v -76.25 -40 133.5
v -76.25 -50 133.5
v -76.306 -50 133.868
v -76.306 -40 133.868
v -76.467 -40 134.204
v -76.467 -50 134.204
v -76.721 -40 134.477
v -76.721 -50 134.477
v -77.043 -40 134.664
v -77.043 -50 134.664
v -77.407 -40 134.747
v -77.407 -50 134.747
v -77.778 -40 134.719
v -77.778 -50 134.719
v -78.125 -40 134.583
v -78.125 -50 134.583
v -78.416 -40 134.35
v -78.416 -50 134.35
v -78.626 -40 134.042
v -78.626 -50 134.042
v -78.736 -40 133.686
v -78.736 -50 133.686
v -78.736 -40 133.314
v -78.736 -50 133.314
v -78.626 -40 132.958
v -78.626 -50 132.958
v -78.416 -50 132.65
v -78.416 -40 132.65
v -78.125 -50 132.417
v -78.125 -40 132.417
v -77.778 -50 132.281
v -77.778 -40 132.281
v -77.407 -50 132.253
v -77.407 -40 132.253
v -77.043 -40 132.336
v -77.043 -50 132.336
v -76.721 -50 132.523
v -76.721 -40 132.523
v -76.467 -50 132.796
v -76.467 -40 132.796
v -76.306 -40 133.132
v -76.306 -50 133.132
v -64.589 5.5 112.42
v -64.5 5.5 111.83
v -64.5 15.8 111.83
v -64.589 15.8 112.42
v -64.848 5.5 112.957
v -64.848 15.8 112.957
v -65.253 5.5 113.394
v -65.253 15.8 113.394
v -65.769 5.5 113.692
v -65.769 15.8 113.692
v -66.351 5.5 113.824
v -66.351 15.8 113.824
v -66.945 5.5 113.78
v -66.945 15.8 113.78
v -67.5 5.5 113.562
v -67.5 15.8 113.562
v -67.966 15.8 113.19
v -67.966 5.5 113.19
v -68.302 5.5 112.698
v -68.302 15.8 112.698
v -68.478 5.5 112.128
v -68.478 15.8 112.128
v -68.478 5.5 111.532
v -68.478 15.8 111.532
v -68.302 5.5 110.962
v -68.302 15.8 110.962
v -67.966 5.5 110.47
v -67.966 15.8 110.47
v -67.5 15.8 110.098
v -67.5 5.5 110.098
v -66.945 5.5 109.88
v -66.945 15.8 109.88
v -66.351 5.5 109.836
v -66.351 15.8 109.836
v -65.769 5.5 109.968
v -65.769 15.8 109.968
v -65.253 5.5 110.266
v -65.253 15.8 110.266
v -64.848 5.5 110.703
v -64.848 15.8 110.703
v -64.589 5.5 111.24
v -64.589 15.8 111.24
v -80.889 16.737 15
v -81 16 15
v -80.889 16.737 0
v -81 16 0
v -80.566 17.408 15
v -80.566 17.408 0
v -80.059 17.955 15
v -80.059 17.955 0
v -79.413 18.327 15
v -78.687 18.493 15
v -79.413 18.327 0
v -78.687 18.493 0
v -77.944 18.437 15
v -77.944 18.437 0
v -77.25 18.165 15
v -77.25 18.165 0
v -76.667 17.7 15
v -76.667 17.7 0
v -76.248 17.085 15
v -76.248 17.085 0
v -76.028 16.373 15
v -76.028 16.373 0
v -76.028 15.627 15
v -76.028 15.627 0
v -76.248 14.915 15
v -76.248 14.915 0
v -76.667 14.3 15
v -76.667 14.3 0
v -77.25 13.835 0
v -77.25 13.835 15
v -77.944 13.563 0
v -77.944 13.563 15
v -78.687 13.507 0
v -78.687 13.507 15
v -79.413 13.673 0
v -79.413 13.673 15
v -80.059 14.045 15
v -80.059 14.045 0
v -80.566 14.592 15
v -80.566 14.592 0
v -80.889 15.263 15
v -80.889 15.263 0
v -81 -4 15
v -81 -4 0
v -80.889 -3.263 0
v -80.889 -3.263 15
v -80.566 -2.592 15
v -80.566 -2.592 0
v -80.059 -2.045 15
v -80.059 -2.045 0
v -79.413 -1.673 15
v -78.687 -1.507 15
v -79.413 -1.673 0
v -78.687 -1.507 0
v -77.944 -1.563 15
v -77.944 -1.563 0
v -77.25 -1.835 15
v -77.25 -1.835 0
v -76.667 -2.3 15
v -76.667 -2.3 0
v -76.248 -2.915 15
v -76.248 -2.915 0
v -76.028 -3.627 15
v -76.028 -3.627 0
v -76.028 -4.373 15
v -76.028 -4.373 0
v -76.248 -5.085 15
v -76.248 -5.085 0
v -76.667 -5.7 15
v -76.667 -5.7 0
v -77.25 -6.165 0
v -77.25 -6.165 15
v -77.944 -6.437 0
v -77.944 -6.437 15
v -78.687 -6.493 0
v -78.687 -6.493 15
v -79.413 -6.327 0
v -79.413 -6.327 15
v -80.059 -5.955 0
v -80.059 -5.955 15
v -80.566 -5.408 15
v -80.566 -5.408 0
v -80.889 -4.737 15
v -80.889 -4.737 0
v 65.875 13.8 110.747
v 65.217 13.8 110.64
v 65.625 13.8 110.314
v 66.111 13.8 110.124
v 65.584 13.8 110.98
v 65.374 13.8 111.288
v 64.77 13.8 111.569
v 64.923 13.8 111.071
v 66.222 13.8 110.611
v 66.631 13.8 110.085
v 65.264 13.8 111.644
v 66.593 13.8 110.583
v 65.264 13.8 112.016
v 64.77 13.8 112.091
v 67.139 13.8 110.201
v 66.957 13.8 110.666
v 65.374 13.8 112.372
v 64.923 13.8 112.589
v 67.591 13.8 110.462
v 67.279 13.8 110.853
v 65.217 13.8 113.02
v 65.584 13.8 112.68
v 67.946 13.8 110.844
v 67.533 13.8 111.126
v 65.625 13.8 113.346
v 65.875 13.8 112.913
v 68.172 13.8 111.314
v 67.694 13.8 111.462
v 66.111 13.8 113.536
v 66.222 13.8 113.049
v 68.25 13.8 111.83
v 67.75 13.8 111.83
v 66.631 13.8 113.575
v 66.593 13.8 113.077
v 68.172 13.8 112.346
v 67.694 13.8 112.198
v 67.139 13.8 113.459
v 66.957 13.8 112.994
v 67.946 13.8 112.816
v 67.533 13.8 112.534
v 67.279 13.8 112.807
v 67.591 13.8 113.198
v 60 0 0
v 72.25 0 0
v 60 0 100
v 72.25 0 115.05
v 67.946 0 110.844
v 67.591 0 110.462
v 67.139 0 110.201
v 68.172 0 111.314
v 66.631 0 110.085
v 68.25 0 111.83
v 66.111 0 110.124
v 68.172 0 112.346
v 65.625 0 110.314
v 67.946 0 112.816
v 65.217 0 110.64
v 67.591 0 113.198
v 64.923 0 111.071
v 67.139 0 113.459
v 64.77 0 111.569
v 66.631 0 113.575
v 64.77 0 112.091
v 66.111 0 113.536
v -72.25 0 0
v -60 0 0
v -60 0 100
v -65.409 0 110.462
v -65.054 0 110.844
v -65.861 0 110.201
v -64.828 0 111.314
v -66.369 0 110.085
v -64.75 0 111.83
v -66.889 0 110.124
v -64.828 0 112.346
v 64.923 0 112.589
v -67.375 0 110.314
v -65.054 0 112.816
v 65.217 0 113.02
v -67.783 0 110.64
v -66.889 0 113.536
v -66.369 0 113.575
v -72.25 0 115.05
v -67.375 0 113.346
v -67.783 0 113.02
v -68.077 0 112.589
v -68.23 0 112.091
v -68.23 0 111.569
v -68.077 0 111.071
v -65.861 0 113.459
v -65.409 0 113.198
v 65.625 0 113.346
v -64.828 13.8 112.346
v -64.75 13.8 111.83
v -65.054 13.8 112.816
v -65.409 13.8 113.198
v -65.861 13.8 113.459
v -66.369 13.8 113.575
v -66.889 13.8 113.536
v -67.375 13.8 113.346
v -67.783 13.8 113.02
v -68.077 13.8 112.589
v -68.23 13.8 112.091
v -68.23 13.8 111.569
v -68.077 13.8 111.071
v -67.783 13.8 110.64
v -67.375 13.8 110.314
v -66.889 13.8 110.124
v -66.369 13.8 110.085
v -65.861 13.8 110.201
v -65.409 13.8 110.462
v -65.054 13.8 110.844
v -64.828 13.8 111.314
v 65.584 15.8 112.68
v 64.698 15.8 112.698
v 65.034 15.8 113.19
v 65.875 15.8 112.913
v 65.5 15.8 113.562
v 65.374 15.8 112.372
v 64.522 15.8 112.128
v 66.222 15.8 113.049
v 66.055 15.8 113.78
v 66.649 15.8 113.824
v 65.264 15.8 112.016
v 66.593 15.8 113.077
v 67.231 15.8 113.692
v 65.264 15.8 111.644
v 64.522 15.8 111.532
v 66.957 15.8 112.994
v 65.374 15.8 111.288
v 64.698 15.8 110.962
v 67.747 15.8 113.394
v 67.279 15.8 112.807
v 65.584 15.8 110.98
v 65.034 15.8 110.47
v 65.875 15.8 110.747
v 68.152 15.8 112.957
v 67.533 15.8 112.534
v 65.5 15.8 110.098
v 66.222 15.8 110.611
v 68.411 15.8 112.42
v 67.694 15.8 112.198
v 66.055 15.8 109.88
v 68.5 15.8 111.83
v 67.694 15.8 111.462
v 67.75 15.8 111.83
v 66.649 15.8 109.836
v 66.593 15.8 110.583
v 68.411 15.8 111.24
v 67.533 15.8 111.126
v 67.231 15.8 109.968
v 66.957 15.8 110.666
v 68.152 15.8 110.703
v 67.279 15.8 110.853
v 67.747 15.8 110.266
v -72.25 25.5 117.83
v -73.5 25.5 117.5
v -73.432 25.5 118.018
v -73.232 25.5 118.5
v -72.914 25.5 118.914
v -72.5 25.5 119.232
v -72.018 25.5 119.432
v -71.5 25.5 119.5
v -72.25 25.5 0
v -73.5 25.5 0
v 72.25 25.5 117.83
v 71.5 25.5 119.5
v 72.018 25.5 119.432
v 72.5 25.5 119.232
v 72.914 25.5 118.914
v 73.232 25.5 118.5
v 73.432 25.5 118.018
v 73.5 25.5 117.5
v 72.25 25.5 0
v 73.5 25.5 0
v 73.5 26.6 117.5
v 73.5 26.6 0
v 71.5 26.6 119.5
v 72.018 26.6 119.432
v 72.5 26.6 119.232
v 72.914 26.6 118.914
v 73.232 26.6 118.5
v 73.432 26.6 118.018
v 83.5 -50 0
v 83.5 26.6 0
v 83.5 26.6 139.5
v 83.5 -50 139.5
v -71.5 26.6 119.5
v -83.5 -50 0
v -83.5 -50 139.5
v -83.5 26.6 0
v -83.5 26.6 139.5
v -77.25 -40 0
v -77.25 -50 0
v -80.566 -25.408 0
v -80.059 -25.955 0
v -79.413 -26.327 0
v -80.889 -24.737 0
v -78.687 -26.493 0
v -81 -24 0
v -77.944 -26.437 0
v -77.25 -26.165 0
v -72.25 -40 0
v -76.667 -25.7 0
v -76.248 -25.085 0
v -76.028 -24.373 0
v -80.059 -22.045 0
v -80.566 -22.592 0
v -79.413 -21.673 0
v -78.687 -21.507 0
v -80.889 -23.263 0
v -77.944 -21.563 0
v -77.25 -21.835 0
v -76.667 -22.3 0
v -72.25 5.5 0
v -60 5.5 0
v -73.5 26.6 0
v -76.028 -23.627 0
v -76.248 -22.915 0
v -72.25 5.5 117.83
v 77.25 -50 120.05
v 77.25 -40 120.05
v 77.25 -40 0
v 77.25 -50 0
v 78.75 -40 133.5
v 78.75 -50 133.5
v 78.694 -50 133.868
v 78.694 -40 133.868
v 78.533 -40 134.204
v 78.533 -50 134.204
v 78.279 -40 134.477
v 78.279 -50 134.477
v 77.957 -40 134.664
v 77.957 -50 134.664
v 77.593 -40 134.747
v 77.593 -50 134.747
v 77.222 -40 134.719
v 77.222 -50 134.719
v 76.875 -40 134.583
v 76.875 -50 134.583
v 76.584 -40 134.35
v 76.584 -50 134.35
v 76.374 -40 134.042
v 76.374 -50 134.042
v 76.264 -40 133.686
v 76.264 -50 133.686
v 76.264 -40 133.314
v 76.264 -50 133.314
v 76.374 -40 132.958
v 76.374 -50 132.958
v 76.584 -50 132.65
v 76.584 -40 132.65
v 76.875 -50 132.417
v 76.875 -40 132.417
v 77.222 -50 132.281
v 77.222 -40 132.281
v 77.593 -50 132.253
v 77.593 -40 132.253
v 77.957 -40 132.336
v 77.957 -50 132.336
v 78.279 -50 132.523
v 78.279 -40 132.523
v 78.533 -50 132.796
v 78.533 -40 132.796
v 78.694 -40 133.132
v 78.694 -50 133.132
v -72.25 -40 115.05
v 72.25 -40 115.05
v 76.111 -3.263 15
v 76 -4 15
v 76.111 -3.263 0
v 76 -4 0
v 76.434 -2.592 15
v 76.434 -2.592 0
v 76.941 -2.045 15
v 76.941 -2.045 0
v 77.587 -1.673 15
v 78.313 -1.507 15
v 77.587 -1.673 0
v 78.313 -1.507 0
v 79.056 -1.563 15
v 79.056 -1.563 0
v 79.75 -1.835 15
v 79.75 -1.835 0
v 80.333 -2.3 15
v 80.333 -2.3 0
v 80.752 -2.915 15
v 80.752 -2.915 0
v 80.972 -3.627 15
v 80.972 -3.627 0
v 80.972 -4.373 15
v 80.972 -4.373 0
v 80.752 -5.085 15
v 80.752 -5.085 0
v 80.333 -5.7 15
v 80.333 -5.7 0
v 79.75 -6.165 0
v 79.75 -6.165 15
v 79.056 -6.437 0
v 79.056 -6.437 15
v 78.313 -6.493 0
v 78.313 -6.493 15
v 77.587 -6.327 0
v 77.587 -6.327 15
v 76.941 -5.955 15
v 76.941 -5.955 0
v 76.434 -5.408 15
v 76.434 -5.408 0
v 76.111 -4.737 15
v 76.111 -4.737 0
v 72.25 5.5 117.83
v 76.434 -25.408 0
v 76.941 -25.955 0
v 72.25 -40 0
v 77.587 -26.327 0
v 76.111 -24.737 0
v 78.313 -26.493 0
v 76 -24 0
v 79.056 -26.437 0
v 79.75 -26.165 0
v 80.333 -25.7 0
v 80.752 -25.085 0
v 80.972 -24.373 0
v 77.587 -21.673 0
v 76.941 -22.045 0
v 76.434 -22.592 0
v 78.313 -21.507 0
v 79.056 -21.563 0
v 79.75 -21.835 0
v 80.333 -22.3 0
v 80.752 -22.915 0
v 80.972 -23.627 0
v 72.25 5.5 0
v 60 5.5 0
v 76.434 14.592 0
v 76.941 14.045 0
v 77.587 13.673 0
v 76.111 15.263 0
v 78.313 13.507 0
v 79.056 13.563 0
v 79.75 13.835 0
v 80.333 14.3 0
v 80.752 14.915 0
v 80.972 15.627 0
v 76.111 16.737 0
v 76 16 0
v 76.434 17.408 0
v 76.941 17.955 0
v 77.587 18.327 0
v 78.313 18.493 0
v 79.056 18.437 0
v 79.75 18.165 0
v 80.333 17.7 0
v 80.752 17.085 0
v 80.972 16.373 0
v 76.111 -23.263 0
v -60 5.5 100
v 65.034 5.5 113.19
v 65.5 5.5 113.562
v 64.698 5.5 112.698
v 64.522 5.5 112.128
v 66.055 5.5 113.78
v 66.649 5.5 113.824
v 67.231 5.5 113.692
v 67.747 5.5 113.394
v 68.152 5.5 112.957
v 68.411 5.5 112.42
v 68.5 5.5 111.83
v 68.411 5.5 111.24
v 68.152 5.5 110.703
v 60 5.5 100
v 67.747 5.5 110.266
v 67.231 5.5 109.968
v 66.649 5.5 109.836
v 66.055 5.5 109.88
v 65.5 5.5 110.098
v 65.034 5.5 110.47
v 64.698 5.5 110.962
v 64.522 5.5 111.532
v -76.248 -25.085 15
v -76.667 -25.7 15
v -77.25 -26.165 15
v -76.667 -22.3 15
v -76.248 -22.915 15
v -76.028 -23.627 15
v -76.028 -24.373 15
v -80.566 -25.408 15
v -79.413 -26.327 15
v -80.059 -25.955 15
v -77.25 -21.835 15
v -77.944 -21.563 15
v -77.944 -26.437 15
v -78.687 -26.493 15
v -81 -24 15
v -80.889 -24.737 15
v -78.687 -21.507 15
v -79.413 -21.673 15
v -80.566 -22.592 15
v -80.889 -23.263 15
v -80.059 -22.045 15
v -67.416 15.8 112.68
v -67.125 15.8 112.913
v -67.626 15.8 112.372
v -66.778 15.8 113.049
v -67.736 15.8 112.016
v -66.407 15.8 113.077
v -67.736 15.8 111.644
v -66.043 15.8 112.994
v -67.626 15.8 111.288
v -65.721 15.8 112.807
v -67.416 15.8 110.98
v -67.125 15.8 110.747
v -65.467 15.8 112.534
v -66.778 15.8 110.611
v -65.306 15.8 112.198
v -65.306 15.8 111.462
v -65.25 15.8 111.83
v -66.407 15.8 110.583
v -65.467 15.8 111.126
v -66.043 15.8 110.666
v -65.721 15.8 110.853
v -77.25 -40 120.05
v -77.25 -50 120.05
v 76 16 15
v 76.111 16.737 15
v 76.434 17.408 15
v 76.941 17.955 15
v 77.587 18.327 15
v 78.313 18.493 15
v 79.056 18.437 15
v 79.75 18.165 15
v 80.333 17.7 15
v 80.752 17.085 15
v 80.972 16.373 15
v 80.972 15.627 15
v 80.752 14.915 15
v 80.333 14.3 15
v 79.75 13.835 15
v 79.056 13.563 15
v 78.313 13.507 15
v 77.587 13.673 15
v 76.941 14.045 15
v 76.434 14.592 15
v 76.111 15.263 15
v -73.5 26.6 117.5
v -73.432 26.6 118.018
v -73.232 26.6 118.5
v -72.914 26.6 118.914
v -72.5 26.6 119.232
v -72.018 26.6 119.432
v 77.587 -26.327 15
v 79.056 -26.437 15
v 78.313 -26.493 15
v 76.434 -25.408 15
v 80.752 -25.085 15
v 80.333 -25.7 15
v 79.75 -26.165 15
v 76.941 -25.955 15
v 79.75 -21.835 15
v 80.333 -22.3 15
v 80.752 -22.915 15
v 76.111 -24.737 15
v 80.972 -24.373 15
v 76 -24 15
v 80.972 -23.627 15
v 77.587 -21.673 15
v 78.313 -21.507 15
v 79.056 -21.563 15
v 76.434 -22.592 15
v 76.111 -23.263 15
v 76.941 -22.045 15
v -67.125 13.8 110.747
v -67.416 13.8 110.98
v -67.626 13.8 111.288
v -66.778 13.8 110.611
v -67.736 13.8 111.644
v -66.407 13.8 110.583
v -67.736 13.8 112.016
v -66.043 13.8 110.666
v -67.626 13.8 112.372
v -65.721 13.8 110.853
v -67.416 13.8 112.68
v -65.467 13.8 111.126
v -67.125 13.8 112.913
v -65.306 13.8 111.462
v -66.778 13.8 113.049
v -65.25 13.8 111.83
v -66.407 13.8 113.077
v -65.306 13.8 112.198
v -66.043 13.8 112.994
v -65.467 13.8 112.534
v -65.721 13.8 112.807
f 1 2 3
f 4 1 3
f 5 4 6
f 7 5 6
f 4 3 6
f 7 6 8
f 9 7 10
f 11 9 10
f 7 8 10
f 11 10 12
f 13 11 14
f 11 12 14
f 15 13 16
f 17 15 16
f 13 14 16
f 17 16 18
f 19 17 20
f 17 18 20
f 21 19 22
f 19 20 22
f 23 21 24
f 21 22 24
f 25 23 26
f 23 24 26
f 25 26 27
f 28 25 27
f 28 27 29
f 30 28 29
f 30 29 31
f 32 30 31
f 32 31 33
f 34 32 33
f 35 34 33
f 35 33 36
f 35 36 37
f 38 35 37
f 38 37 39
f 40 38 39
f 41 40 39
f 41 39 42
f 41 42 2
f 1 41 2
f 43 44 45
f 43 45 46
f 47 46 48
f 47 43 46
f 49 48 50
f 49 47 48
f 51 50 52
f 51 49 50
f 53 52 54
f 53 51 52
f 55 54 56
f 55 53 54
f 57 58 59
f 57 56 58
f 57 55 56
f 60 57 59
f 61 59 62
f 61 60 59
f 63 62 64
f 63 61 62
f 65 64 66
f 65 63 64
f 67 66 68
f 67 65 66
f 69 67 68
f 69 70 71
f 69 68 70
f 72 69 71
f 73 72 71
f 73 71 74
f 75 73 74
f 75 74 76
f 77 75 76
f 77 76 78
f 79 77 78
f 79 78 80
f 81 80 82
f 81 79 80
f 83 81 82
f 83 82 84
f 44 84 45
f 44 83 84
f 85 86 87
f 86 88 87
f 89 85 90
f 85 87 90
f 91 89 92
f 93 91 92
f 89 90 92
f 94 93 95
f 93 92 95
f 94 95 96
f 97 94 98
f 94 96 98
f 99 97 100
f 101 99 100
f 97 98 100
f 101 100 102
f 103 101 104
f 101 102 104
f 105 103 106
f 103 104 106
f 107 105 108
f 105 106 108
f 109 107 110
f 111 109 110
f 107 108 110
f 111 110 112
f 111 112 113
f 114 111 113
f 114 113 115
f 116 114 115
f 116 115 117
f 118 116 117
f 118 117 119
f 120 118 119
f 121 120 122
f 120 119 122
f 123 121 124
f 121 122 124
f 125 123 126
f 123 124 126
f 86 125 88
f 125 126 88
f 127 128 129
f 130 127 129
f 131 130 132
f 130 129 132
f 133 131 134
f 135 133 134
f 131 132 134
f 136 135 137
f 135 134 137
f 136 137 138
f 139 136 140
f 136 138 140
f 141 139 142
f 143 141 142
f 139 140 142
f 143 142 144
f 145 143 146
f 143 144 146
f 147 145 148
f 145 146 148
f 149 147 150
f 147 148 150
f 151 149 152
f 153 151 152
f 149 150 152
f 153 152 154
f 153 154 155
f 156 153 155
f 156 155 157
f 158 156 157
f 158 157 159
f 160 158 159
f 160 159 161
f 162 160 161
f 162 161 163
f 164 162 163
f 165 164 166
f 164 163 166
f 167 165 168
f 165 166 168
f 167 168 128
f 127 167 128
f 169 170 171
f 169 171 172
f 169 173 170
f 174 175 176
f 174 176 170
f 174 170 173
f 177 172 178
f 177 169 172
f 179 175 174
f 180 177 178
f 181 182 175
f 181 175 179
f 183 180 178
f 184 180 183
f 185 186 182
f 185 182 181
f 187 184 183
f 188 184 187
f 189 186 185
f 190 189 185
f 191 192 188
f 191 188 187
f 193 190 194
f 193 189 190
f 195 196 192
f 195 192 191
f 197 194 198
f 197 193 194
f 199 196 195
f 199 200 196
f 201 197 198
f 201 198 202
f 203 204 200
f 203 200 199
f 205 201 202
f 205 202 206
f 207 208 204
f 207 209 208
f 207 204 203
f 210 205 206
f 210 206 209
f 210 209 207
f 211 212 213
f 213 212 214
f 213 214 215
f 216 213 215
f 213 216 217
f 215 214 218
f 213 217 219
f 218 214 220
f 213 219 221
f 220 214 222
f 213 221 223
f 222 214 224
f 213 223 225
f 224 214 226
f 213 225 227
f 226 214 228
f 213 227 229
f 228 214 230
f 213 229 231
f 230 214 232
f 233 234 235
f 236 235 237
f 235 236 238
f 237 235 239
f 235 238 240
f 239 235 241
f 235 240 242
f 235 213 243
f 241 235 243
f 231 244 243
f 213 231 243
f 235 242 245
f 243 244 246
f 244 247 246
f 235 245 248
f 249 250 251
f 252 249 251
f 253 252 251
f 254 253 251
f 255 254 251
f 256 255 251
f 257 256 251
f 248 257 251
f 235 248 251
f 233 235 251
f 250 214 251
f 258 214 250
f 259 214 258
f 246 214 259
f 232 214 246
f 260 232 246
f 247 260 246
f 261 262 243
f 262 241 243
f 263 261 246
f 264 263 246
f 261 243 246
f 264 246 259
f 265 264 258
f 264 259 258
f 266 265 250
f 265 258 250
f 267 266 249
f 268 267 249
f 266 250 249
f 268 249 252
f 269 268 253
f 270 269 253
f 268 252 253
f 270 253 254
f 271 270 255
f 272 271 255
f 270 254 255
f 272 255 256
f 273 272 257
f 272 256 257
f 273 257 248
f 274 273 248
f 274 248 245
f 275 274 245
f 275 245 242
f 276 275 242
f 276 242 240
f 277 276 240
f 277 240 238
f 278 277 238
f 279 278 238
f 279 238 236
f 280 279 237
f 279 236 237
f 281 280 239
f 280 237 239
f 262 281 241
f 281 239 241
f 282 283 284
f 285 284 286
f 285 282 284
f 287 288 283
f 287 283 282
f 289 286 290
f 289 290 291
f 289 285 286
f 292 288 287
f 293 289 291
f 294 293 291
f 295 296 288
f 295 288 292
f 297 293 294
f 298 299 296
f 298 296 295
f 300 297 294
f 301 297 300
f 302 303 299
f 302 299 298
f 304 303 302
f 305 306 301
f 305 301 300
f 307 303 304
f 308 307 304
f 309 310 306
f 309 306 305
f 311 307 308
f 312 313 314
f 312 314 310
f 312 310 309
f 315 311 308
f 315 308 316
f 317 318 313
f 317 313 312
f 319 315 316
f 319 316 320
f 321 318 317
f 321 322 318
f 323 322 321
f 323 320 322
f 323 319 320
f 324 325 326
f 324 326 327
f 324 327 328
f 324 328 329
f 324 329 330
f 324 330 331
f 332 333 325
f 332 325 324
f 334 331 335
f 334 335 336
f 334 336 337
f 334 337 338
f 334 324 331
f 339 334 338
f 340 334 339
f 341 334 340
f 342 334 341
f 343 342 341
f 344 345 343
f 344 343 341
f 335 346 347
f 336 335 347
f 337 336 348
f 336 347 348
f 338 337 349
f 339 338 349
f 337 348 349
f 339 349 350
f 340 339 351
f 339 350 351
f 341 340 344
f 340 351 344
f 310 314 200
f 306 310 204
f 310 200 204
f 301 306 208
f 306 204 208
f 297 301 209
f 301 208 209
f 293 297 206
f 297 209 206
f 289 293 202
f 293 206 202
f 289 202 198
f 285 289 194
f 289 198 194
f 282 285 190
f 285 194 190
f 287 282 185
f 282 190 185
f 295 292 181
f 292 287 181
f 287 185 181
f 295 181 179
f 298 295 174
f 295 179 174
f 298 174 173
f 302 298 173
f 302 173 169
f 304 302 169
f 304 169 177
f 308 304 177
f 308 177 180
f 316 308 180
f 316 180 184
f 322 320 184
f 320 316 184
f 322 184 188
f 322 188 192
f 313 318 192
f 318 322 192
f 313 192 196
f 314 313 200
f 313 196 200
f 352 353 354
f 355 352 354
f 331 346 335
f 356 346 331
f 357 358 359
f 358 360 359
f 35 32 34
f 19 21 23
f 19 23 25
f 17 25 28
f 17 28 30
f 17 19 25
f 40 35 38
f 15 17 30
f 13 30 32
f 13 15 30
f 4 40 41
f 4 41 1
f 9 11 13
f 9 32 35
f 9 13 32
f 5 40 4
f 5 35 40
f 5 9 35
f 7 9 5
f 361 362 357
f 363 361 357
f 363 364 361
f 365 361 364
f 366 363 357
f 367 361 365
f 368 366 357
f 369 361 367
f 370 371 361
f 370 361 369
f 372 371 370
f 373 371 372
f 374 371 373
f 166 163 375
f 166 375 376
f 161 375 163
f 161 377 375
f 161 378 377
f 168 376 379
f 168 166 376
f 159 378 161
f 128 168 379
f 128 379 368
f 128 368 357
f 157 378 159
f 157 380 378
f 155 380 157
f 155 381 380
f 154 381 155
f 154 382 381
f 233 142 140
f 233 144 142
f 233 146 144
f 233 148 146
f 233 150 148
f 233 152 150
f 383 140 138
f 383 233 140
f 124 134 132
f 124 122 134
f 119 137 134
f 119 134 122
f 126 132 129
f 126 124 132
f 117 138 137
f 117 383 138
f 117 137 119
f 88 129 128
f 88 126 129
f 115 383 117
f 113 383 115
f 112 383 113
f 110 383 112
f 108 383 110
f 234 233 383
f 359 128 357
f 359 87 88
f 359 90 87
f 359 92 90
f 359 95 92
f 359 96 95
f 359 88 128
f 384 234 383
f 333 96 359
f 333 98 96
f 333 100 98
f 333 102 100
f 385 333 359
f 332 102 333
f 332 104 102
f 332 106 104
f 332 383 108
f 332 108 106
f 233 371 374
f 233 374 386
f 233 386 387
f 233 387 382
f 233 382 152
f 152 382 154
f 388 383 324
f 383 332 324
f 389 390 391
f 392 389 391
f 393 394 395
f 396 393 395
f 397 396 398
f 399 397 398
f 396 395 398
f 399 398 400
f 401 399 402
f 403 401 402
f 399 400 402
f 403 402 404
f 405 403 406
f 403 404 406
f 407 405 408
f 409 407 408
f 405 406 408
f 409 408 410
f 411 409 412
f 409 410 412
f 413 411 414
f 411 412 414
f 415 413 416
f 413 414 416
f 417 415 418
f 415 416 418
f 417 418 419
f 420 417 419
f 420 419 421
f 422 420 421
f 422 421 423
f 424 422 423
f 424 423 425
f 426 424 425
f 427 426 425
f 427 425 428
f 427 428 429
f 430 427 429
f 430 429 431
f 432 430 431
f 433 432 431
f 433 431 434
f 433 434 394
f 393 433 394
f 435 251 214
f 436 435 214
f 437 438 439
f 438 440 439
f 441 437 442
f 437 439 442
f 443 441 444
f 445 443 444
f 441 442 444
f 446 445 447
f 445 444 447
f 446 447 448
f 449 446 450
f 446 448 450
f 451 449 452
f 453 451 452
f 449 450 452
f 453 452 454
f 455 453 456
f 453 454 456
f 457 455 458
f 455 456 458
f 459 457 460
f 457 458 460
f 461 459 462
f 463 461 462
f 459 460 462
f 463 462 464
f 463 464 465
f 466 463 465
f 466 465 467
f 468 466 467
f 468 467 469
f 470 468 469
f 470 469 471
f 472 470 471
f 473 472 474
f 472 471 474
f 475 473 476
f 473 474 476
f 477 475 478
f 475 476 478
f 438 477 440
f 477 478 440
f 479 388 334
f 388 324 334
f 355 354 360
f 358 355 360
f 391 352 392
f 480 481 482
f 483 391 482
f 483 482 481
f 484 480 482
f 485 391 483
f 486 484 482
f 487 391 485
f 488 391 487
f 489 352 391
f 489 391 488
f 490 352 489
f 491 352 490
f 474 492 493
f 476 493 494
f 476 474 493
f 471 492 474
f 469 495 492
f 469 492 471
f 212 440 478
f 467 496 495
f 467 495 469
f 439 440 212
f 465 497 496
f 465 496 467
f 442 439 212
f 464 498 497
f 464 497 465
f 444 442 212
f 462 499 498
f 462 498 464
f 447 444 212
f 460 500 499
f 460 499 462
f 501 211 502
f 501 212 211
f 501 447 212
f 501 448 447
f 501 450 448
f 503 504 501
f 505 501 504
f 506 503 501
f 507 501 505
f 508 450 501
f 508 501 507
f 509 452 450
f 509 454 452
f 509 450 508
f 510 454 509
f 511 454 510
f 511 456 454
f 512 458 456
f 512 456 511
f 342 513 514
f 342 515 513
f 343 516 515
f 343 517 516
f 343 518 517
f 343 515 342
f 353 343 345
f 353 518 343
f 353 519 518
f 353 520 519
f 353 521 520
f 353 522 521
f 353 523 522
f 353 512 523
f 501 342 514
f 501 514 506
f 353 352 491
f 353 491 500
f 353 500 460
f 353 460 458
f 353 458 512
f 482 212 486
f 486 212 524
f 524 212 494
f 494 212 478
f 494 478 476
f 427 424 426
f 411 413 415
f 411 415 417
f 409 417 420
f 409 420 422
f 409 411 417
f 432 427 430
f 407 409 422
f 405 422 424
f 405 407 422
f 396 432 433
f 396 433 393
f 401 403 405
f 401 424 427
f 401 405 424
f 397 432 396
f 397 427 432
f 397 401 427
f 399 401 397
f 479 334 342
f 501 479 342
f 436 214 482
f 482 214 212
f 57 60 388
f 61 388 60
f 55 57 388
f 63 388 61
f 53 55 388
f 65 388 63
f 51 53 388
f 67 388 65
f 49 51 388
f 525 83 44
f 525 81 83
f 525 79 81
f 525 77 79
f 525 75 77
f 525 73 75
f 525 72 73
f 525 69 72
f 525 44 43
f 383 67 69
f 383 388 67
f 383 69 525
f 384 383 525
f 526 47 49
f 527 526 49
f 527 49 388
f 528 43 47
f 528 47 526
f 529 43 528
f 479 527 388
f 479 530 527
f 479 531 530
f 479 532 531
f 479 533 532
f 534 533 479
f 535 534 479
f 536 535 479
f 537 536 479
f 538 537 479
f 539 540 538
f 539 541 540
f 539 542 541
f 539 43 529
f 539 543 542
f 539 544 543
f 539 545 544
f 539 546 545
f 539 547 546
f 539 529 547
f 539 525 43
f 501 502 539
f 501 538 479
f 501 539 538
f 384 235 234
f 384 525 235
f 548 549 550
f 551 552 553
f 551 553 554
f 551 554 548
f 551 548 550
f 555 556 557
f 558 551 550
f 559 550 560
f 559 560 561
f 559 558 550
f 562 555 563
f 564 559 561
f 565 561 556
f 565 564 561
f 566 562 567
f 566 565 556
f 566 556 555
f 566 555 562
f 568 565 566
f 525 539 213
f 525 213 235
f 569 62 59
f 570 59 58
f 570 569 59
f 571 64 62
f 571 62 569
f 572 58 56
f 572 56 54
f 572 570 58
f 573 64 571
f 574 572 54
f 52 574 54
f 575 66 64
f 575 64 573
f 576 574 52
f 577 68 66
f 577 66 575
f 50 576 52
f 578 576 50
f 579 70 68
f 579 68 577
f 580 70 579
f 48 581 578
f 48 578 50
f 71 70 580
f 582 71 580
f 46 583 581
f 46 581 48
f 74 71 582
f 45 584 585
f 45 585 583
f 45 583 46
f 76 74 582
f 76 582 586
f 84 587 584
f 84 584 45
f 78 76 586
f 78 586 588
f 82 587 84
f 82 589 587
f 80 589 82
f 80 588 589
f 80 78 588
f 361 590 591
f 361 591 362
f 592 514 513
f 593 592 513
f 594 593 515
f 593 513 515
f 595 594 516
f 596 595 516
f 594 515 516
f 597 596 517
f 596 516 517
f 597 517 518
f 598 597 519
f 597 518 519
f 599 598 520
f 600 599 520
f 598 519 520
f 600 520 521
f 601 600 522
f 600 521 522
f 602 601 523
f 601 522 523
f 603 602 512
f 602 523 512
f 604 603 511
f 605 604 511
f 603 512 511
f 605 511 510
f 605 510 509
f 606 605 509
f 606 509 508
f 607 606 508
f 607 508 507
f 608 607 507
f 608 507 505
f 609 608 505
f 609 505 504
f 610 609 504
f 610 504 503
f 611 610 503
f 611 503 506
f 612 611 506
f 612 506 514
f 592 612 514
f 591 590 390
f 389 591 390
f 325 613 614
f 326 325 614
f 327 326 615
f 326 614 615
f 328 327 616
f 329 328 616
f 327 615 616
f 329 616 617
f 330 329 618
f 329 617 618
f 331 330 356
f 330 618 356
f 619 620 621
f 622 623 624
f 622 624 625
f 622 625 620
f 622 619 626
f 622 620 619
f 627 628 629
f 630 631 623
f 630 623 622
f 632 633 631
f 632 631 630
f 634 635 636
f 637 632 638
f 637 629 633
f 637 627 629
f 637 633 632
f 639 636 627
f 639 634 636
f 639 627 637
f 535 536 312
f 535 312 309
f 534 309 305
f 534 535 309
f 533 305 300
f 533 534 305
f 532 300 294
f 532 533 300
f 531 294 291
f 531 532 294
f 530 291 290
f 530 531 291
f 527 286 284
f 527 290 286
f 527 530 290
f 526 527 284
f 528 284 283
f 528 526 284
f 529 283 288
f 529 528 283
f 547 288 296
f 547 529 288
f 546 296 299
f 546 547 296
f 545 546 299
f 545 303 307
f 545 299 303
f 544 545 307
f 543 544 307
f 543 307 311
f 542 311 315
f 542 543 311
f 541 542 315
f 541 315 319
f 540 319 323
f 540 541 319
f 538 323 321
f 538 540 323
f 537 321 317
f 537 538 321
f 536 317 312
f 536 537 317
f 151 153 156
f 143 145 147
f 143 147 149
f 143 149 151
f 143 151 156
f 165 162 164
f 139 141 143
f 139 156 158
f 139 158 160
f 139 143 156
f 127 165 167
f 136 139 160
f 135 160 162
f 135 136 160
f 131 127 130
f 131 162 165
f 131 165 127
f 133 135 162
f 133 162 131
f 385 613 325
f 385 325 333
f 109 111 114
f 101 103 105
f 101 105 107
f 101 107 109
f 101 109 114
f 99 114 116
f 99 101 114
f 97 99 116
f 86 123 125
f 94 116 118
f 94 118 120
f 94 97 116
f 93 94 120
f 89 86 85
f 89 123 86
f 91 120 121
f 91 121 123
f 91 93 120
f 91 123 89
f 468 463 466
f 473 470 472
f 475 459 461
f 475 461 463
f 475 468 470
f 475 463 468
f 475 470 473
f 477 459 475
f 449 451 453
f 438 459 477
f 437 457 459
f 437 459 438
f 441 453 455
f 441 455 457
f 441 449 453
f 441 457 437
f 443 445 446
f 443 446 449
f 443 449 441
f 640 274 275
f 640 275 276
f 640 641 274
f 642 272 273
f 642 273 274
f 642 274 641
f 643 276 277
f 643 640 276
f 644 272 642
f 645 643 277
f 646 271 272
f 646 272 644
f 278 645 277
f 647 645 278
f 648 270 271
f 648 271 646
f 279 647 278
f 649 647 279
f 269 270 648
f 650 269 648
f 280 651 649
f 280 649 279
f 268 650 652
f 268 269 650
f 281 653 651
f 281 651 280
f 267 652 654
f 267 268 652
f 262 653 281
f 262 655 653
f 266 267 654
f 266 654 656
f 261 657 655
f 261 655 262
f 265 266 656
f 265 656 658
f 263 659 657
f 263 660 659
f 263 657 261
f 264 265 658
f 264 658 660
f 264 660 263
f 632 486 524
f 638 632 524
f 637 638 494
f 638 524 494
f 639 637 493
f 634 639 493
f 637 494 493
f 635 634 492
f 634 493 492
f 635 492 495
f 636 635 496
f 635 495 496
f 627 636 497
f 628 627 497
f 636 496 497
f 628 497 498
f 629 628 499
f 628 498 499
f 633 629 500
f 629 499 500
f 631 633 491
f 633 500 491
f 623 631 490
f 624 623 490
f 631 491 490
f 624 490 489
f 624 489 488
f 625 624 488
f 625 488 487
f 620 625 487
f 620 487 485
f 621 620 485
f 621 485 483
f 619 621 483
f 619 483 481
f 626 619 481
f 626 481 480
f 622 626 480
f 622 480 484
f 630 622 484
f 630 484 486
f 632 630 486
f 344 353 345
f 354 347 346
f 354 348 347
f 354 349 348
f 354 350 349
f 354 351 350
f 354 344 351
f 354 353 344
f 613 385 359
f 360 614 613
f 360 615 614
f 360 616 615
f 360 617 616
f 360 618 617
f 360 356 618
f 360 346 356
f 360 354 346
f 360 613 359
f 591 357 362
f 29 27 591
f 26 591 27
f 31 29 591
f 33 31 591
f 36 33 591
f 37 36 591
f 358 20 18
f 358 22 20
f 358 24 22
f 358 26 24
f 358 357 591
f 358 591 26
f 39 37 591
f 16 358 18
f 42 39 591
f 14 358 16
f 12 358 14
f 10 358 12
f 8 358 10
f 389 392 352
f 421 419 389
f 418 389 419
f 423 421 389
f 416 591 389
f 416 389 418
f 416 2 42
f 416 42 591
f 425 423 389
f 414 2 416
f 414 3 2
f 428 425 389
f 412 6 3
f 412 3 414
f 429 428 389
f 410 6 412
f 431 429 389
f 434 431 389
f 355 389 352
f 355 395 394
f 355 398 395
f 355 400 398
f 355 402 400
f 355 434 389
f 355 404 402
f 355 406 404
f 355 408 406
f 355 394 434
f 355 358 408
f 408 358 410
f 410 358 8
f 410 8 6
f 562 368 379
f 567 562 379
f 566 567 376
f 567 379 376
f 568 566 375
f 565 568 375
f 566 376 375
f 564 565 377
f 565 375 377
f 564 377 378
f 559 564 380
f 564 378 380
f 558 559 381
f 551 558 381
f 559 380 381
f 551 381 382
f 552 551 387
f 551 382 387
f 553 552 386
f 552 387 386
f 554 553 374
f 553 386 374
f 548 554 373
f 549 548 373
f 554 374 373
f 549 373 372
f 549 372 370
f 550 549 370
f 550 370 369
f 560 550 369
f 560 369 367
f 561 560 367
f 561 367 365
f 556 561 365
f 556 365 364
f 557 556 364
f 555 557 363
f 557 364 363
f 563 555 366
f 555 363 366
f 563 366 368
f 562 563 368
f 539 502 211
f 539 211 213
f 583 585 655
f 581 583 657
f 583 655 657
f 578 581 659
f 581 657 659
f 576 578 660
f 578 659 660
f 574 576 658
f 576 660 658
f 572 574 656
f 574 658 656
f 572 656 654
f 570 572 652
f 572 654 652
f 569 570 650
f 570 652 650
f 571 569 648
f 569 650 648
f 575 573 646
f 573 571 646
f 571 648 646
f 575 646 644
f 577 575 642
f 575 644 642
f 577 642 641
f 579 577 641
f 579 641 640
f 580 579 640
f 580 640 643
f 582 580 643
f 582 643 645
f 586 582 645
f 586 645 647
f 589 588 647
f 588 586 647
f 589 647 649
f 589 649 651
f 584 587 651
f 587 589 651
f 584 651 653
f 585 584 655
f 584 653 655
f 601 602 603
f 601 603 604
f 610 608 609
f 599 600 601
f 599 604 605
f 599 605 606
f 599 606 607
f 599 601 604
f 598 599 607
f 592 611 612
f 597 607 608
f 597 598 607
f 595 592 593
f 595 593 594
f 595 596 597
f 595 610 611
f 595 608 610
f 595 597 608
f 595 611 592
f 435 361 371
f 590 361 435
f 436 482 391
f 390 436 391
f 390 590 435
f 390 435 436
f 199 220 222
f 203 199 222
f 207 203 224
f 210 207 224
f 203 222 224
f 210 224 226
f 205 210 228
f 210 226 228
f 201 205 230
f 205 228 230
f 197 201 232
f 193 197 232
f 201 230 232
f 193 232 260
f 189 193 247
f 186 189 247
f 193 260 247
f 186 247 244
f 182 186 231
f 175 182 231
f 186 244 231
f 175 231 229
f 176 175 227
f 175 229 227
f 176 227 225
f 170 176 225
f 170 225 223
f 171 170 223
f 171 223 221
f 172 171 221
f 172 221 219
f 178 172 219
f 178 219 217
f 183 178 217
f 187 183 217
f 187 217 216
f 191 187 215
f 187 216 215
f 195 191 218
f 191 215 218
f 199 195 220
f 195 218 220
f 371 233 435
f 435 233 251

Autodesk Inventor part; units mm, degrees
ref_plane "YZ Plane" through (0, 0, 0) normal (1, 0, 0) x (0, 1, 0)
ref_plane "XZ Plane" through (0, 0, 0) normal (0, 1, 0) x (-1, 0, 0)
ref_plane "XY Plane" through (0, 0, 0) normal (0, 0, 1) x (1, 0, 0)
sketch "Sketch1" plane through (0, 0, 0) normal (0, 1, 0) x (-1, 0, 0)
  line L0 (-83.5, 139.5) -> (83.5, 139.5)
  line L1 (83.5, 139.5) -> (83.5, -139.5)
  line L2 (83.5, -139.5) -> (-83.5, -139.5)
  line L3 (-83.5, -139.5) -> (-83.5, 139.5)
  line L4 (-83.5, 139.5) -> (83.5, -139.5) construction
  line L5 (83.5, 139.5) -> (-83.5, -139.5) construction
  point P0 (0, 0)
  dimension "d0" = 167
  dimension "d1" = 279
extrude "Extrusion1" add sketch "Sketch1" along normal blind 26.6
sketch "Sketch2" plane through (0, 26.6, 0) normal (0, 1, 0) x (1, 0, 0)
  line L0 (71.5, -119.5) -> (-71.5, -119.5)
  line L1 (-73.5, -117.5) -> (-73.5, 117.5)
  line L2 (-71.5, 119.5) -> (71.5, 119.5)
  line L3 (73.5, 117.5) -> (73.5, -117.5)
  line L4 (73.5, -119.5) -> (-73.5, 119.5) construction
  line L5 (-73.5, -119.5) -> (73.5, 119.5) construction
  arc A0 (-73.5, -117.5) -> (-71.5, -119.5) centre (-71.5, -117.5) ccw
  arc A1 (-71.5, 119.5) -> (-73.5, 117.5) centre (-71.5, 117.5) ccw
  arc A2 (73.5, 117.5) -> (71.5, 119.5) centre (71.5, 117.5) ccw
  arc A3 (71.5, -119.5) -> (73.5, -117.5) centre (71.5, -117.5) ccw
  point P0 (0, 0)
  dimension "d4" = 147
  dimension "d5" = 239
  dimension "d6" = 2
extrude "Extrusion2" cut sketch "Sketch2" against normal blind 1.1
sketch "Sketch3" plane through (0, 25.5, 0) normal (0, 1, 0) x (1, 0, 0)
  line L0 (-73.5, -117.5) -> (-73.5, 117.5) projected
  line L1 (71.5, -119.5) -> (-71.5, -119.5) projected
  line L2 (-72.25, -117.83) -> (72.25, -117.83)
  line L3 (72.25, -117.83) -> (72.25, 112.27)
  line L4 (72.25, 112.27) -> (-72.25, 112.27)
  line L5 (-72.25, 112.27) -> (-72.25, -117.83)
  point P0 (0, 0)
  dimension "d9" = 1.25
  dimension "d10" = 1.67
  dimension "d11" = 144.5
  dimension "d12" = 230.1
extrude "Extrusion3" cut sketch "Sketch3" against normal blind 20
sketch "Sketch4" plane through (0, 5.5, 0) normal (0, 1, 0) x (1, 0, 0)
  circle A0 centre (-66.5, -111.83) radius 2
  line L0 (72.25, -117.83) -> (-72.25, -117.83) projected
  line L1 (-72.25, -117.83) -> (-72.25, 112.27) projected
  circle A1 centre (66.5, -111.83) radius 2
  line L2 (72.25, 112.27) -> (72.25, -117.83) projected
  circle A2 centre (-66.5, 106.27) radius 2
  line L3 (-72.25, 112.27) -> (72.25, 112.27) projected
  circle A3 centre (66.5, 106.27) radius 2
  point P0 (0, 0)
  dimension "d15" = 4
  dimension "d16" = 6
  dimension "d17" = 5.75
  dimension "d18" = 4
  dimension "d19" = 6
  dimension "d20" = 5.75
  dimension "d21" = 4
  dimension "d22" = 5.75
  dimension "d23" = 6
  dimension "d24" = 4
  dimension "d25" = 6
  dimension "d26" = 5.75
extrude "Extrusion4" add sketch "Sketch4" along normal blind 10.3 contours A0 | A1 | A2 | A3
sketch "Sketch5" plane through (0, 5.5, 0) normal (0, 1, 0) x (1, 0, 0)
  circle A0 centre (-66.5, -111.83) radius 2 projected
  circle A1 centre (-66.5, -111.83) radius 1.25
  circle A2 centre (-66.5, 106.27) radius 2 projected
  circle A3 centre (-66.5, 106.27) radius 1.25
  circle A4 centre (66.5, 106.27) radius 2 projected
  circle A5 centre (66.5, 106.27) radius 1.25
  circle A6 centre (66.5, -111.83) radius 1.25
  point P0 (0, 0)
  dimension "d29" = 2.5
  dimension "d30" = 2.5
  dimension "d31" = 2.5
  dimension "d32" = 2.5
extrude "Extrusion5" cut sketch "Sketch5" along normal blind 10.3 and the other way blind 5.5 contours A1 | A3 | A5 | A6
sketch "Sketch8" plane through (0, 0, 0) normal (0, -1, 0) x (1, 0, 0)
  circle A0 centre (66.5, 111.83) radius 1.25 projected
  circle A1 centre (66.5, 111.83) radius 1.75
  circle A2 centre (66.5, -106.27) radius 1.25 projected
  circle A3 centre (66.5, -106.27) radius 1.75
  circle A4 centre (-66.5, -106.27) radius 1.25 projected
  circle A5 centre (-66.5, -106.27) radius 1.75
  circle A6 centre (-66.5, 111.83) radius 1.75
  point P0 (0, 0)
  dimension "d49" = 3.5
  dimension "d50" = 3.5
  dimension "d51" = 3.5
  dimension "d52" = 3.5
extrude "Extrusion8" cut sketch "Sketch8" against normal blind 13.8
sketch "Sketch9" plane through (0, 5.5, 0) normal (0, 1, 0) x (1, 0, 0)
  line L0 (60, -100) -> (-60, -100)
  line L1 (-60, -100) -> (-60, 100)
  line L2 (-60, 100) -> (60, 100)
  line L3 (60, 100) -> (60, -100)
  line L4 (60, -100) -> (-60, 100) construction
  line L5 (-60, -100) -> (60, 100) construction
  point P0 (0, 0)
  dimension "d55" = 120
  dimension "d56" = 200
extrude "Extrusion9" cut sketch "Sketch9" against normal blind 5.8
sketch "Sketch10" plane through (0, 0, 0) normal (0, -1, 0) x (1, 0, 0)
  line L0 (83.5, 139.5) -> (83.5, -139.5) projected
  line L1 (-83.5, -139.5) -> (-83.5, 139.5) projected
  line L2 (83.5, 139.5) -> (-83.5, 139.5)
  line L3 (-83.5, 139.5) -> (-83.5, -139.5)
  line L4 (-83.5, -139.5) -> (83.5, -139.5)
  line L5 (83.5, -139.5) -> (83.5, 139.5)
  line L6 (72.25, -115.05) -> (-72.25, -115.05)
  line L7 (-72.25, -115.05) -> (-72.25, 115.05)
  line L8 (-72.25, 115.05) -> (72.25, 115.05)
  line L9 (72.25, 115.05) -> (72.25, -115.05)
  line L10 (72.25, -115.05) -> (-72.25, 115.05) construction
  line L11 (-72.25, -115.05) -> (72.25, 115.05) construction
  line L12 (-83.5, -139.5) -> (83.5, -139.5)
  line L13 (83.5, -139.5) -> (83.5, 139.5)
  line L14 (83.5, 139.5) -> (-83.5, 139.5)
  line L15 (-83.5, 139.5) -> (-83.5, -139.5)
  point P0 (0, 0)
  point P1 (71.5, 119.5)
  dimension "d67" = 144.5
  dimension "d68" = 230.1
extrude "Extrusion10" add sketch "Sketch10" along normal blind 40
sketch "Sketch12" plane through (0, -40, 0) normal (0, -1, 0) x (1, 0, 0)
  line L0 (-72.25, -115.05) -> (-72.25, 115.05) projected
  line L1 (72.25, -115.05) -> (-72.25, -115.05) projected
  line L2 (-77.25, -120.05) -> (-72.25, -120.05)
  line L3 (-72.25, -120.05) -> (-72.25, 120.05)
  line L4 (-72.25, 120.05) -> (-77.25, 120.05)
  line L5 (-77.25, 120.05) -> (-77.25, -120.05)
  line L6 (72.25, 115.05) -> (72.25, -115.05) projected
  line L7 (77.25, -120.05) -> (72.25, -120.05)
  line L8 (72.25, -120.05) -> (72.25, 120.05)
  line L9 (72.25, 120.05) -> (77.25, 120.05)
  line L10 (77.25, 120.05) -> (77.25, -120.05)
  line L11 (72.25, 115.05) -> (-72.25, 115.05) projected
  line L12 (72.25, 120.05) -> (-72.25, 120.05)
  line L13 (-72.25, 120.05) -> (-72.25, 115.05)
  line L14 (-72.25, 115.05) -> (72.25, 115.05)
  line L15 (72.25, 115.05) -> (72.25, 120.05)
  line L16 (-83.5, 139.5) -> (-83.5, -139.5) projected
  line L17 (83.5, 139.5) -> (-83.5, 139.5) projected
  line L18 (-83.5, -139.5) -> (83.5, -139.5)
  line L19 (83.5, -139.5) -> (83.5, 139.5)
  line L20 (83.5, 139.5) -> (-83.5, 139.5)
  line L21 (-83.5, 139.5) -> (-83.5, -139.5)
  line L22 (-72.25, -115.05) -> (72.25, -115.05) projected
  line L23 (-72.25, -115.05) -> (72.25, -115.05)
  line L24 (72.25, -115.05) -> (72.25, -120.05)
  line L25 (72.25, -120.05) -> (-72.25, -120.05)
  line L26 (-72.25, -120.05) -> (-72.25, -115.05)
  point P0 (0, 0)
  dimension "d69" = 5
  dimension "d70" = 5
  dimension "d71" = 240.1
  dimension "d72" = 5
  dimension "d73" = 5
  dimension "d74" = 240.1
extrude "Extrusion11" add sketch "Sketch12" along normal blind 10
sketch "Sketch13" plane through (0, -50, 0) normal (0, -1, 0) x (1, 0, 0)
  circle A0 centre (-77.5, -133.5) radius 1.25
  line L0 (-83.5, 139.5) -> (-83.5, -139.5) projected
  line L1 (-83.5, -139.5) -> (83.5, -139.5) projected
  circle A1 centre (-77.5, 133.5) radius 1.25
  line L2 (83.5, 139.5) -> (-83.5, 139.5) projected
  circle A2 centre (77.5, 133.5) radius 1.25
  line L3 (83.5, -139.5) -> (83.5, 139.5) projected
  circle A3 centre (77.5, -133.5) radius 1.25
  point P0 (0, 0)
  dimension "d77" = 2.5
  dimension "d78" = 6
  dimension "d79" = 6
  dimension "d80" = 2.5
  dimension "d81" = 6
  dimension "d82" = 6
  dimension "d83" = 2.5
  dimension "d84" = 6
  dimension "d85" = 6
  dimension "d86" = 6
  dimension "d87" = 6
extrude "Extrusion12" cut sketch "Sketch13" against normal blind 10 contours A0 | A1 | A2 | A3
sketch "Sketch14" plane through (83.5, 26.6, 139.5) normal (1, 0, 0) x (0, 0, -1)
  line L0 (0, 0) -> (279, 0) projected
  line L1 (139.5, 0) -> (139.5, -76.6)
  line L2 (259.55, -76.6) -> (19.45, -76.6) projected
  point P0 (139.5, -26.6)
split_face "Split1"
sketch "Sketch18" plane through (83.5, -50, 0) normal (1, 0, 0) x (0, 0, -1)
  line L0 (0, 76.6) -> (139.5, 76.6) projected
  line L1 (139.5, 76.6) -> (139.5, 0) projected
  line L2 (0, 76.6) -> (139.5, 76.6)
  line L3 (139.5, 76.6) -> (139.5, 0)
  line L4 (139.5, 0) -> (0, 0)
  line L5 (0, 0) -> (0, 76.6)
  point P0 (0, 50)
extrude "Extrusion15" cut sketch "Sketch18" against normal blind 168.1125
sketch "Sketch19" plane through (83.5, -50, 0) normal (0, 0, -1) x (-1, 0, 0)
  line L0 (0, 76.6) -> (10, 76.6) projected
  circle A0 centre (5, 66) radius 2.5
  circle A1 centre (5, 46) radius 2.5
  circle A2 centre (5, 26) radius 2.5
  line L1 (157, 76.6) -> (167, 76.6) projected
  circle A3 centre (162, 66) radius 2.5
  circle A4 centre (162, 46) radius 2.5
  circle A5 centre (162, 26) radius 2.5
  point P0 (83.5, 50)
  dimension "d97" = 5
  dimension "d99" = 5
  dimension "d101" = 5
  dimension "d102" = 5
  dimension "d104" = 5
  dimension "d106" = 5
extrude "Extrusion16" cut sketch "Sketch19" against normal blind 15
properties part number "Enclosure"
